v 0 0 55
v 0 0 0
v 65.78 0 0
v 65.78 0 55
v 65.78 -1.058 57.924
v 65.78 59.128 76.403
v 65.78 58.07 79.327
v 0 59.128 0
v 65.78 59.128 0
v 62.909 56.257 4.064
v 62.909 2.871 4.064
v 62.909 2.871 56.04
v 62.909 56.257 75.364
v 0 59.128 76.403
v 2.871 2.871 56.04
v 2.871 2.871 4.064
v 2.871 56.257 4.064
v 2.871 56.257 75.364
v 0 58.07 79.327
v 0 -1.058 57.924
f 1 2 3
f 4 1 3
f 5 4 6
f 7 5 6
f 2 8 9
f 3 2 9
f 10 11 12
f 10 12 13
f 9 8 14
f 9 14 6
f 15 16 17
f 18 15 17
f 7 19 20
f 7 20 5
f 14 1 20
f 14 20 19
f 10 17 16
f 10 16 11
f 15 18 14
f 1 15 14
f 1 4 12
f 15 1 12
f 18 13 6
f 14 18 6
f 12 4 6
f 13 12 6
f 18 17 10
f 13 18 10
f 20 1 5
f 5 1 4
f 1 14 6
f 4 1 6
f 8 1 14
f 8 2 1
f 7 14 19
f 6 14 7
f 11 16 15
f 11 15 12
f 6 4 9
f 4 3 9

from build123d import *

# Parameters (mm, degrees)
F0_W     = 65.779954
F0_H     = 59.128046
F1_DEPTH = 4.063999
F3_W     = 65.779954
F3_H     = 59.128046
F3_W_2   = 60.038372
F3_H_2   = 53.386464
F4_DEPTH = 72.339199
F6_DEPTH = 65.779954
F7_W     = 65.779954
F7_H     = 62.882481
F8_DEPTH = 3.108938


with BuildPart() as f1:
    # F0 (on Top) → F1 (new body)
    with BuildSketch(Plane.XY):
        with Locations((32.889977, 29.564023)):
            Rectangle(F0_W, F0_H)
    extrude(amount=F1_DEPTH)

    # F3 (on face) → F4 (join)
    with BuildSketch(Plane.XY.offset(4.063999)):
        with Locations((32.889977, 29.564023)):
            Rectangle(F3_W, F3_H)
        with Locations((32.889977, 29.564023)):
            Rectangle(F3_W_2, F3_H_2, mode=Mode.SUBTRACT)
    extrude(amount=F4_DEPTH)

    # F5 (on face) → F6 (cut, through all)
    with BuildSketch(Plane.YZ.offset(65.779954)):
        Polygon((0, 76.403199), (0, 55.00038), (59.128046, 76.403199), align=None)
    extrude(amount=-F6_DEPTH, mode=Mode.SUBTRACT)


with BuildPart() as f8:
    # F7 (on face) → F8 (new body)
    with BuildSketch(Plane(origin=(0, -17.602358, 48.628783), x_dir=(1, 0, 0), z_dir=(0, -0.340362, 0.940294))):
        with Locations((32.889977, 50.16129)):
            Rectangle(F7_W, F7_H)
    extrude(amount=F8_DEPTH)


solid = Compound([f1.part, f8.part])
